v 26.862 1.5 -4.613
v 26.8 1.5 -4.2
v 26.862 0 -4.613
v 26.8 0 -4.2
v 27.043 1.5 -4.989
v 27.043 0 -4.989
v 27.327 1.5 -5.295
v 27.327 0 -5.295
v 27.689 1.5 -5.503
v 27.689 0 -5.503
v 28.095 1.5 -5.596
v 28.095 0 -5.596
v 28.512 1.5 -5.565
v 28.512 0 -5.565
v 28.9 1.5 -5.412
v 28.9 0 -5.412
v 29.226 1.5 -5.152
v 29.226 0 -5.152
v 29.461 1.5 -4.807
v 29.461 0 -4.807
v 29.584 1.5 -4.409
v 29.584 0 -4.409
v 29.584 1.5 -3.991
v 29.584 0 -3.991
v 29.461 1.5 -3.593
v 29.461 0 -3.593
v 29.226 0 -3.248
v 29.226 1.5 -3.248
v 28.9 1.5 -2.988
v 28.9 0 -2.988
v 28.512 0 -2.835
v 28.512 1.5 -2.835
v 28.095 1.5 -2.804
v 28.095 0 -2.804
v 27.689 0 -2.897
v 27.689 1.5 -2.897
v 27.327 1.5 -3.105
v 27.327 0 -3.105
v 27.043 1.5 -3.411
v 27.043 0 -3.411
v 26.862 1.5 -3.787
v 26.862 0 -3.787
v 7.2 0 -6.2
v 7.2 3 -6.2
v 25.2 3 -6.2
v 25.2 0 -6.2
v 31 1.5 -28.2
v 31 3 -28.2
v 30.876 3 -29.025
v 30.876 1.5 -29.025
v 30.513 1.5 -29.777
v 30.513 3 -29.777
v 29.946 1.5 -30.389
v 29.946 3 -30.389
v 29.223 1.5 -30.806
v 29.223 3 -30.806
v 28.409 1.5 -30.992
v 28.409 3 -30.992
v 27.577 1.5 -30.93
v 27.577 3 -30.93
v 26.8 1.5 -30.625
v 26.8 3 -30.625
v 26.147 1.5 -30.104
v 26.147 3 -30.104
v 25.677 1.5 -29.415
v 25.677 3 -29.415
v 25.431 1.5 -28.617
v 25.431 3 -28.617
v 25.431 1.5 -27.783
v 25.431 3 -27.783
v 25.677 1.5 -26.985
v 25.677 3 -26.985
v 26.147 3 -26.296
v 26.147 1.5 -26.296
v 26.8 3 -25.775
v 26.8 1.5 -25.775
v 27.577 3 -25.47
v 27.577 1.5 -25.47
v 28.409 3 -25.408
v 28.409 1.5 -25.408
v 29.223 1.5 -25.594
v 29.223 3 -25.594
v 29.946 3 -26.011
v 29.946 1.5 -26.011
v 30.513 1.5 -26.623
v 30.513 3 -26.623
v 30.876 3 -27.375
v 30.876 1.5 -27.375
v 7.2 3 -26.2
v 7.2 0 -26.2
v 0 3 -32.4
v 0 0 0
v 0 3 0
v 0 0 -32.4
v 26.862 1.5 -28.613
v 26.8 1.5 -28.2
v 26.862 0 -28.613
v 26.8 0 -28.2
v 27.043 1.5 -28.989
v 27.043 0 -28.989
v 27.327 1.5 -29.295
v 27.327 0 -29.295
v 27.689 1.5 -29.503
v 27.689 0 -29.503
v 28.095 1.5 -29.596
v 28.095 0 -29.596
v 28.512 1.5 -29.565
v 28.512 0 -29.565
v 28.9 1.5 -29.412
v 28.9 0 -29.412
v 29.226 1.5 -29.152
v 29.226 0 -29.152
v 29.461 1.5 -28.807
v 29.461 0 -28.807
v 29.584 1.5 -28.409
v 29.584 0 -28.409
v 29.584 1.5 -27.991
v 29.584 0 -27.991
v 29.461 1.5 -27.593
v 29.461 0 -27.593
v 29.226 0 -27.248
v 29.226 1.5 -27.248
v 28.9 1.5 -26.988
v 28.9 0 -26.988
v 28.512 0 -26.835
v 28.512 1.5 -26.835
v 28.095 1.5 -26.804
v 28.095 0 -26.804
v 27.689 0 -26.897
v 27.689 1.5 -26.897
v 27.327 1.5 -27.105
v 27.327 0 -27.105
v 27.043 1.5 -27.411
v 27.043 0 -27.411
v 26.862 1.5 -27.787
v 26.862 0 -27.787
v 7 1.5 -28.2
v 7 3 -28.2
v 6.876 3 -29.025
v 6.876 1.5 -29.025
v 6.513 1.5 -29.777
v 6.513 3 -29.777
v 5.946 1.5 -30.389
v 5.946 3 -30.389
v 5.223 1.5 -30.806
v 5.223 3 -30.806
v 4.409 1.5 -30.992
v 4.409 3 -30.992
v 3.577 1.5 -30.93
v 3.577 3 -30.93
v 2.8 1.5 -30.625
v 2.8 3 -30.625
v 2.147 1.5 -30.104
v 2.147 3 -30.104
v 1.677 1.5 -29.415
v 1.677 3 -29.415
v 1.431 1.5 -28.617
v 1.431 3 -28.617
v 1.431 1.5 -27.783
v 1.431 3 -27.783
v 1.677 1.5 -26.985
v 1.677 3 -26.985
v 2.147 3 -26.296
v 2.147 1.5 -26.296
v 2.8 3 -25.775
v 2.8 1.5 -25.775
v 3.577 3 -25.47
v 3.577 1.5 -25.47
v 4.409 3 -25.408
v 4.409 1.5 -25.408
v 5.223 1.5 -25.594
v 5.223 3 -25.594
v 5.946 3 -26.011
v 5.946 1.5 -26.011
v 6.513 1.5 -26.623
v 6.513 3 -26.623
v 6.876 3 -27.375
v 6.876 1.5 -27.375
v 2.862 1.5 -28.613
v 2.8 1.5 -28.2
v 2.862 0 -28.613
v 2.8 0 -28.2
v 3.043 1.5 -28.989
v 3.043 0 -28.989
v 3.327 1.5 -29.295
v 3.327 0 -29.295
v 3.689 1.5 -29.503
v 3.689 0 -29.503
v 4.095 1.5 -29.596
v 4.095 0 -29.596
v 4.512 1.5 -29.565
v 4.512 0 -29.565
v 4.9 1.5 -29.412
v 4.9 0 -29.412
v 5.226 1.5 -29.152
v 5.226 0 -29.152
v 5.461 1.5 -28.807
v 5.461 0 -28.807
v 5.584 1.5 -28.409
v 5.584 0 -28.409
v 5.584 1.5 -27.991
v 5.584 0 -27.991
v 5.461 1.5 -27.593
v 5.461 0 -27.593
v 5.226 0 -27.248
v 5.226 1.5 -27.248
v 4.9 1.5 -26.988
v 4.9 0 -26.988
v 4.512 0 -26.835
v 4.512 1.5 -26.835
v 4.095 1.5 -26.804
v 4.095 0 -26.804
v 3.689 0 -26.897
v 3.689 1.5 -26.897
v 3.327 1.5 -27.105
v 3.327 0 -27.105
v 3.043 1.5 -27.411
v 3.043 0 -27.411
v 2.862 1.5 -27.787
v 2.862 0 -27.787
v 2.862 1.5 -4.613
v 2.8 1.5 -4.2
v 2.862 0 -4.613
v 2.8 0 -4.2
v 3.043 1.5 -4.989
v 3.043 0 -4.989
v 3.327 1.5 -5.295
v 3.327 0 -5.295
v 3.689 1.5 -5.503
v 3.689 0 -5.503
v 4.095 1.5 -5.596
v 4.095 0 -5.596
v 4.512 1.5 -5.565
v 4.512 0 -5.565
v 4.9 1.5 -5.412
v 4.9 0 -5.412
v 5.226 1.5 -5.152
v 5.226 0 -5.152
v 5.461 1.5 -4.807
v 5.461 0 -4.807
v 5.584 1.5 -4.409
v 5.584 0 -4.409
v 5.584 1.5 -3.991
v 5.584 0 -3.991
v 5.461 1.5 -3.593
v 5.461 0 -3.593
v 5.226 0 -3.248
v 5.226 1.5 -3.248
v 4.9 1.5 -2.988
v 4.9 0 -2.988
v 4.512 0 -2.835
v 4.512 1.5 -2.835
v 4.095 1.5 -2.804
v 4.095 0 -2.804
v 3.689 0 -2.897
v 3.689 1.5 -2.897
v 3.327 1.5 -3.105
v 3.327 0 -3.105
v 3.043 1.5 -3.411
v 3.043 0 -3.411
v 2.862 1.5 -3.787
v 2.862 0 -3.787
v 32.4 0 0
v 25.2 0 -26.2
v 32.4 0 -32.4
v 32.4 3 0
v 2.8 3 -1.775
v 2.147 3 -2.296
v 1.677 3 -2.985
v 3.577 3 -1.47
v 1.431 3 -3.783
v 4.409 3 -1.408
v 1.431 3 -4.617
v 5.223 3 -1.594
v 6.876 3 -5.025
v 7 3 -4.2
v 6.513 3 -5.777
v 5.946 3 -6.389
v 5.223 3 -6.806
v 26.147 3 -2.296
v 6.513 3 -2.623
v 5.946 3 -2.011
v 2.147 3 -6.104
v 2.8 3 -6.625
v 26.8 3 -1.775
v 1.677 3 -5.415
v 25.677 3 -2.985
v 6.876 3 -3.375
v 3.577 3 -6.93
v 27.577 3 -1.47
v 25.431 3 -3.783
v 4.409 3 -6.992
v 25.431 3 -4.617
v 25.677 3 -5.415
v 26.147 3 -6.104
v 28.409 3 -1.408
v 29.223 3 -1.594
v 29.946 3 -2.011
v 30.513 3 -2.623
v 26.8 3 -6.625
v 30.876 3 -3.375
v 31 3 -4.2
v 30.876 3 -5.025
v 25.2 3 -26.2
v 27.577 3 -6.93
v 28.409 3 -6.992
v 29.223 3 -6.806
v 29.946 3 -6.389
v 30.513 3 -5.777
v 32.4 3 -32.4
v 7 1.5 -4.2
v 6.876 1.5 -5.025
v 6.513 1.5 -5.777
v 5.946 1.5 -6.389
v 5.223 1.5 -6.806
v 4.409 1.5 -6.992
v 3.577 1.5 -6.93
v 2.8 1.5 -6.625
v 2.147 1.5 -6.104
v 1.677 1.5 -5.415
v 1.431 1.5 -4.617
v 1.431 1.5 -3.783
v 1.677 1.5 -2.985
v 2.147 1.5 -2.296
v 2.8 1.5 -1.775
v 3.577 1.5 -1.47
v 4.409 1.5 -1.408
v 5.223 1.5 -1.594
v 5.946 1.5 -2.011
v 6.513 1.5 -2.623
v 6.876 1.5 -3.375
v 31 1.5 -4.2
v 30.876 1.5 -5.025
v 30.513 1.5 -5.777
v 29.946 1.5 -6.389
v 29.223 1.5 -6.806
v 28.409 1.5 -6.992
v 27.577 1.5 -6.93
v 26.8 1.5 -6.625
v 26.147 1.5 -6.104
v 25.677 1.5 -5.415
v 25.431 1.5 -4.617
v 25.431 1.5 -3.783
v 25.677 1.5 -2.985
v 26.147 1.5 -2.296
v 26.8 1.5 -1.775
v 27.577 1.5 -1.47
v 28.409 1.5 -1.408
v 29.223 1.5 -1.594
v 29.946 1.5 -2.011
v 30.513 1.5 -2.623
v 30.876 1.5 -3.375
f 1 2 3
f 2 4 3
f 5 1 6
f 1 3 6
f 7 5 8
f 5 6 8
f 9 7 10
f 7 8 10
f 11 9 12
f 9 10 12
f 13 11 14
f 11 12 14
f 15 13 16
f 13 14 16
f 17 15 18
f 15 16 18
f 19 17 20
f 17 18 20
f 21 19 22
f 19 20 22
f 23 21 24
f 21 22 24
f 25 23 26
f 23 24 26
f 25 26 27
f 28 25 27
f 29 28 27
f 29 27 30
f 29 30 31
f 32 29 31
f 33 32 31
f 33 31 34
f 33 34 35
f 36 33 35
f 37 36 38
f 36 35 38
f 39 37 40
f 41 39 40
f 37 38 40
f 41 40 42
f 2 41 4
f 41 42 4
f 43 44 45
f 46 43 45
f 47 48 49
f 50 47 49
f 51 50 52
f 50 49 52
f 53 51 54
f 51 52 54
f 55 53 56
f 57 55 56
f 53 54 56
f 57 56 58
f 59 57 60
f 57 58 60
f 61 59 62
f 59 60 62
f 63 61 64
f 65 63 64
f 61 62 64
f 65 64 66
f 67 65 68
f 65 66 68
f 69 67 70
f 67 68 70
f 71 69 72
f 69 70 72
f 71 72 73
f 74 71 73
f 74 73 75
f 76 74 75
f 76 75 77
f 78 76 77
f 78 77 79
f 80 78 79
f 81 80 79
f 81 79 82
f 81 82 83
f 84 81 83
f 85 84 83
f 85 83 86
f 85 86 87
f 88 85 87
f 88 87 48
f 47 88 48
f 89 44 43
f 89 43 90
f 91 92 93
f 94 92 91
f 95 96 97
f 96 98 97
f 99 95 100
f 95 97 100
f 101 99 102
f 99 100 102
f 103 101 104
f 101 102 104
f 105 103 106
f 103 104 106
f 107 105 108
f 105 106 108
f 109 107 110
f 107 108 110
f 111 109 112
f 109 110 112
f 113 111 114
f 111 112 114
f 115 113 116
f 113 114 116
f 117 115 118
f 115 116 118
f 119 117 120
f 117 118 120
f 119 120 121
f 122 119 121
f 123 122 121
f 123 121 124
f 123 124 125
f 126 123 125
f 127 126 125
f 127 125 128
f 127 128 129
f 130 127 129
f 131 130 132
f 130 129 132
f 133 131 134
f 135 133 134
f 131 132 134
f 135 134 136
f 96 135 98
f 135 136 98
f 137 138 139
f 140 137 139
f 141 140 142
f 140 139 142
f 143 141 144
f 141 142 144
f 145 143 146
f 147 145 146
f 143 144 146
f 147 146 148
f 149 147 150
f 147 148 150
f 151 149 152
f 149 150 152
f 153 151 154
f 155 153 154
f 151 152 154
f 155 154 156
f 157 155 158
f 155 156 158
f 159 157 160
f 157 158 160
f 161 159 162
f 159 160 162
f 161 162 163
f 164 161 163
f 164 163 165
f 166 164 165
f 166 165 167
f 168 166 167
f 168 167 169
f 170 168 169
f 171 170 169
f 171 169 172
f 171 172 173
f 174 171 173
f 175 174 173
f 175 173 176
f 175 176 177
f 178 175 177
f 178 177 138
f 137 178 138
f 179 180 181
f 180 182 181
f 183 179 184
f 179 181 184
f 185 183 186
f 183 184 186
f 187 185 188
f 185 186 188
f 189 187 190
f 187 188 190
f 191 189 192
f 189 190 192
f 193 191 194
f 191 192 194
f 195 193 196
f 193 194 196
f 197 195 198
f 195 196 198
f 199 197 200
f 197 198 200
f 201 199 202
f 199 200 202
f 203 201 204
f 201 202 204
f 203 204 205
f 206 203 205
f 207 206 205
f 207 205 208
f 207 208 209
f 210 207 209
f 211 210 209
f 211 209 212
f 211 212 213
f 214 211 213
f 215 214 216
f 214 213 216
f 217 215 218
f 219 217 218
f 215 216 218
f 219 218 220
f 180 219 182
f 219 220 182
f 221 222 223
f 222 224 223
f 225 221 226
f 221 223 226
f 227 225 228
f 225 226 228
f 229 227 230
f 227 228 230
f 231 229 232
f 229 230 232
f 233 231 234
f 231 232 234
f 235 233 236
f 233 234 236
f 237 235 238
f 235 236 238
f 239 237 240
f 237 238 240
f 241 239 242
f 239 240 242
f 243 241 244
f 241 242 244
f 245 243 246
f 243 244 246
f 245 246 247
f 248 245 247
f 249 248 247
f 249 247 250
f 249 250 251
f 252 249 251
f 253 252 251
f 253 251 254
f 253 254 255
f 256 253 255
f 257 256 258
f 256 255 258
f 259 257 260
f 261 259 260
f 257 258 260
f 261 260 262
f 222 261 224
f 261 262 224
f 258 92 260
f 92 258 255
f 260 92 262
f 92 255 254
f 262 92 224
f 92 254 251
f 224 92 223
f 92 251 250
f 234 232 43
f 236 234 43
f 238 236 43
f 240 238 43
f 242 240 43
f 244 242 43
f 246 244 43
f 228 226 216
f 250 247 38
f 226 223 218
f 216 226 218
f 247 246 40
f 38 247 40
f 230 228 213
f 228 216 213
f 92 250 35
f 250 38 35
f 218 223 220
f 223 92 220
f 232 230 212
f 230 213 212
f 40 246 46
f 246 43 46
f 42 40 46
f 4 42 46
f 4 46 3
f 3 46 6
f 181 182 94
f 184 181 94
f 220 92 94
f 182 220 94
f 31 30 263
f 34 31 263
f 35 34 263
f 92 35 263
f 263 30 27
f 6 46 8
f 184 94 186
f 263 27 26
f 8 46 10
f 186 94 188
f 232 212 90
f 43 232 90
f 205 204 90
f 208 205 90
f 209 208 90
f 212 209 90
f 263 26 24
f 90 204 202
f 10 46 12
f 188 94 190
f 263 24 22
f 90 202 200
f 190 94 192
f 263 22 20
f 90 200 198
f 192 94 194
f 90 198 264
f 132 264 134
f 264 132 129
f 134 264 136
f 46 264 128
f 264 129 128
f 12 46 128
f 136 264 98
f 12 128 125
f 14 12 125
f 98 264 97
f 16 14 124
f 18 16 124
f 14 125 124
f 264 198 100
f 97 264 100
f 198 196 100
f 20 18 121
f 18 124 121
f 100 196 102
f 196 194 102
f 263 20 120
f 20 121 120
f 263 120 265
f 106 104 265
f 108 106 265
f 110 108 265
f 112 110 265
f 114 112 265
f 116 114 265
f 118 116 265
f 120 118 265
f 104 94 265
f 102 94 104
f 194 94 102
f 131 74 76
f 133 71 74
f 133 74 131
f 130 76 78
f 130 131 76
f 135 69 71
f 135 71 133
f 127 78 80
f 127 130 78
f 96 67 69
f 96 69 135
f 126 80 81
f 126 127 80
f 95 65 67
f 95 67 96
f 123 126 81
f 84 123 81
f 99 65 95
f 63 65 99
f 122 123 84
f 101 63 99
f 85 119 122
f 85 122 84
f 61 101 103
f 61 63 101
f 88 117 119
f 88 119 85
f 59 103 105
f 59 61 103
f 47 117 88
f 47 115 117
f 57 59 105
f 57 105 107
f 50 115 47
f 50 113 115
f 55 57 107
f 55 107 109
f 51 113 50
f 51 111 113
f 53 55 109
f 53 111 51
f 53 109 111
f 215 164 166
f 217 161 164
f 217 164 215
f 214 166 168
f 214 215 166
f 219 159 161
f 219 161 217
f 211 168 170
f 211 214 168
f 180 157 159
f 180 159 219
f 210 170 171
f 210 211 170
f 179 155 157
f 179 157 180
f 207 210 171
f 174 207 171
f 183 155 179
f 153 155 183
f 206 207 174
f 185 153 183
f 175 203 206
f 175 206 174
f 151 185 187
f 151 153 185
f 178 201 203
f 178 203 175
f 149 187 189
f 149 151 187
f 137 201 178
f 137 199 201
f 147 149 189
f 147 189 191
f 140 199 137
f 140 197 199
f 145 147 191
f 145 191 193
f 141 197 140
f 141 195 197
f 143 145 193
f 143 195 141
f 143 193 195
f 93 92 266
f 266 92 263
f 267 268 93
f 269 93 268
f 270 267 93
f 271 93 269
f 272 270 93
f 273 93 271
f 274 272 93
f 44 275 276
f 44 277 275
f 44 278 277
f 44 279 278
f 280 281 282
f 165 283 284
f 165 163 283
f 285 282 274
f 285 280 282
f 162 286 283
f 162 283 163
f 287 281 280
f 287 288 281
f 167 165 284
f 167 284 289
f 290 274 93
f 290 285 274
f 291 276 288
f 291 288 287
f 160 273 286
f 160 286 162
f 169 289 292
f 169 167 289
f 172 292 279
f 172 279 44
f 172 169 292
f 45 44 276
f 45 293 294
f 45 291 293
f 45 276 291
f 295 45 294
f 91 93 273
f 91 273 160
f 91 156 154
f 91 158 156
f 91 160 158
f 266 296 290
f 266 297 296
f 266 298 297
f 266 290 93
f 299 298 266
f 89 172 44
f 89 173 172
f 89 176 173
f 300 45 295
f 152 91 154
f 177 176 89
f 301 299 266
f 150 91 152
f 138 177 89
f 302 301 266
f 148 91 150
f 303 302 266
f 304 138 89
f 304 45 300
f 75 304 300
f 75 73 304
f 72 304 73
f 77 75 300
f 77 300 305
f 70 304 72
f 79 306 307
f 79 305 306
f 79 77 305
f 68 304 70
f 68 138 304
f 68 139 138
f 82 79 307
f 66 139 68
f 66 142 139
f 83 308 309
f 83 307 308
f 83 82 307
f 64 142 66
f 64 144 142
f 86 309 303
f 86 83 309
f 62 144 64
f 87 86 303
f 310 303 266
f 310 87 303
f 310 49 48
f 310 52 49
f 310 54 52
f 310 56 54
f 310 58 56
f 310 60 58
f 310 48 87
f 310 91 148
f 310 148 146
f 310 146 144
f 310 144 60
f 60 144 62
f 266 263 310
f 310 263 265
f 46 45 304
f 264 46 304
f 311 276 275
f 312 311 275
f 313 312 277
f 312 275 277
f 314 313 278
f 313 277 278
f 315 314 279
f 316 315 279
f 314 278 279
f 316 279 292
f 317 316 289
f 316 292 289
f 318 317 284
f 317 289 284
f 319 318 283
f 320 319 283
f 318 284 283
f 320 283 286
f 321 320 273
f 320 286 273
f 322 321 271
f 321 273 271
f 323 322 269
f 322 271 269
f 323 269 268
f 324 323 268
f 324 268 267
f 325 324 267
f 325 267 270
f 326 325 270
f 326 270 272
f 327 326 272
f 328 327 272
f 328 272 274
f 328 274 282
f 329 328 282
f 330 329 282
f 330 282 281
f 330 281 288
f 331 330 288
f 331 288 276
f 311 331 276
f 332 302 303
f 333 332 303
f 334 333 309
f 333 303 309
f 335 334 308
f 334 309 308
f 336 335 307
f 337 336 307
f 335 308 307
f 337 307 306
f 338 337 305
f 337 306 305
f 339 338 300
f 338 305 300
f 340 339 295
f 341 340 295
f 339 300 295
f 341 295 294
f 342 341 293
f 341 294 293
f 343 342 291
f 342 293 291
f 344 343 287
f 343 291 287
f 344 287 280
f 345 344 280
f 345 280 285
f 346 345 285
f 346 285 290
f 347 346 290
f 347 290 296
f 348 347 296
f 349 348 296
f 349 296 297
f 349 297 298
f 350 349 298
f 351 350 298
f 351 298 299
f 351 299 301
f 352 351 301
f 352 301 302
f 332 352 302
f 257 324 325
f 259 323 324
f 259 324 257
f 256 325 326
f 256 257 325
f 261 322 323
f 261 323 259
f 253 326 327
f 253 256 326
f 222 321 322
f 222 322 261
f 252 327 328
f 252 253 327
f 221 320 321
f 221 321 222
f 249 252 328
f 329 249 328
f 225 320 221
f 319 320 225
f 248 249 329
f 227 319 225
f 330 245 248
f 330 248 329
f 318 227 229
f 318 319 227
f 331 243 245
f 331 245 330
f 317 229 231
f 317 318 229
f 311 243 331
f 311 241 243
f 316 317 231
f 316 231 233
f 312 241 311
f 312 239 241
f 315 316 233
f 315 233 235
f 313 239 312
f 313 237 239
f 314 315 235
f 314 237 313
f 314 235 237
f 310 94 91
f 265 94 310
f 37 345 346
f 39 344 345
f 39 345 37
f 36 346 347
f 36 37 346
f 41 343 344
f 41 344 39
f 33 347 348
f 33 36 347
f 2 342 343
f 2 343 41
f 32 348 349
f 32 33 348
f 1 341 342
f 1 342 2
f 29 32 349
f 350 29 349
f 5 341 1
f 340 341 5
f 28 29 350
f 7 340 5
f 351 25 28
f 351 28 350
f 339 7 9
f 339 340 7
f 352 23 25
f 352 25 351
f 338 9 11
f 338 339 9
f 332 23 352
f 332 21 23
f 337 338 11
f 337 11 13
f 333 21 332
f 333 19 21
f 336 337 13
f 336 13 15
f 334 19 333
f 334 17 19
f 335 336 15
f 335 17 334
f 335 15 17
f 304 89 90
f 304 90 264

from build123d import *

# Parameters (mm, degrees)
SKETCH1_W                        = 32.4
SKETCH1_H                        = 32.4
BOSS_EXTRUDE1_DEPTH              = 3
CBORE_FOR_M1_6_SHCS1_D           = 2.8
CBORE_FOR_M1_6_SHCS1_CBORE_D     = 5.6
CBORE_FOR_M1_6_SHCS1_CBORE_DEPTH = 1.5
SKETCH5_W                        = 18
SKETCH5_H                        = 20
CUT_EXTRUDE1_DEPTH               = 46.918623673


with BuildPart() as part:
    # Sketch1 → Boss-Extrude1 (new body)
    with BuildSketch(Plane(origin=(0, 0, 0), x_dir=(1, 0, 0), z_dir=(0, 1, 0))):
        with Locations((16.2, 16.2)):
            Rectangle(SKETCH1_W, SKETCH1_H)
    extrude(amount=BOSS_EXTRUDE1_DEPTH)

    # CBORE for M1.6 SHCS1 (through all)
    with Locations(Plane(origin=(0, 3, 0), x_dir=(1, 0, 0), z_dir=(0, 1, 0))):
        with Locations((4.2, 28.2), (28.2, 28.2), (28.2, 4.2), (4.2, 4.2)):
            CounterBoreHole(CBORE_FOR_M1_6_SHCS1_D / 2, CBORE_FOR_M1_6_SHCS1_CBORE_D / 2, CBORE_FOR_M1_6_SHCS1_CBORE_DEPTH)

    # Sketch5 → Cut-Extrude1 (cut, through all)
    with BuildSketch(Plane(origin=(0, 3, 0), x_dir=(1, 0, 0), z_dir=(0, 1, 0))):
        with Locations((16.2, 16.2)):
            Rectangle(SKETCH5_W, SKETCH5_H)
    extrude(amount=-CUT_EXTRUDE1_DEPTH, mode=Mode.SUBTRACT)


solid = part.part
